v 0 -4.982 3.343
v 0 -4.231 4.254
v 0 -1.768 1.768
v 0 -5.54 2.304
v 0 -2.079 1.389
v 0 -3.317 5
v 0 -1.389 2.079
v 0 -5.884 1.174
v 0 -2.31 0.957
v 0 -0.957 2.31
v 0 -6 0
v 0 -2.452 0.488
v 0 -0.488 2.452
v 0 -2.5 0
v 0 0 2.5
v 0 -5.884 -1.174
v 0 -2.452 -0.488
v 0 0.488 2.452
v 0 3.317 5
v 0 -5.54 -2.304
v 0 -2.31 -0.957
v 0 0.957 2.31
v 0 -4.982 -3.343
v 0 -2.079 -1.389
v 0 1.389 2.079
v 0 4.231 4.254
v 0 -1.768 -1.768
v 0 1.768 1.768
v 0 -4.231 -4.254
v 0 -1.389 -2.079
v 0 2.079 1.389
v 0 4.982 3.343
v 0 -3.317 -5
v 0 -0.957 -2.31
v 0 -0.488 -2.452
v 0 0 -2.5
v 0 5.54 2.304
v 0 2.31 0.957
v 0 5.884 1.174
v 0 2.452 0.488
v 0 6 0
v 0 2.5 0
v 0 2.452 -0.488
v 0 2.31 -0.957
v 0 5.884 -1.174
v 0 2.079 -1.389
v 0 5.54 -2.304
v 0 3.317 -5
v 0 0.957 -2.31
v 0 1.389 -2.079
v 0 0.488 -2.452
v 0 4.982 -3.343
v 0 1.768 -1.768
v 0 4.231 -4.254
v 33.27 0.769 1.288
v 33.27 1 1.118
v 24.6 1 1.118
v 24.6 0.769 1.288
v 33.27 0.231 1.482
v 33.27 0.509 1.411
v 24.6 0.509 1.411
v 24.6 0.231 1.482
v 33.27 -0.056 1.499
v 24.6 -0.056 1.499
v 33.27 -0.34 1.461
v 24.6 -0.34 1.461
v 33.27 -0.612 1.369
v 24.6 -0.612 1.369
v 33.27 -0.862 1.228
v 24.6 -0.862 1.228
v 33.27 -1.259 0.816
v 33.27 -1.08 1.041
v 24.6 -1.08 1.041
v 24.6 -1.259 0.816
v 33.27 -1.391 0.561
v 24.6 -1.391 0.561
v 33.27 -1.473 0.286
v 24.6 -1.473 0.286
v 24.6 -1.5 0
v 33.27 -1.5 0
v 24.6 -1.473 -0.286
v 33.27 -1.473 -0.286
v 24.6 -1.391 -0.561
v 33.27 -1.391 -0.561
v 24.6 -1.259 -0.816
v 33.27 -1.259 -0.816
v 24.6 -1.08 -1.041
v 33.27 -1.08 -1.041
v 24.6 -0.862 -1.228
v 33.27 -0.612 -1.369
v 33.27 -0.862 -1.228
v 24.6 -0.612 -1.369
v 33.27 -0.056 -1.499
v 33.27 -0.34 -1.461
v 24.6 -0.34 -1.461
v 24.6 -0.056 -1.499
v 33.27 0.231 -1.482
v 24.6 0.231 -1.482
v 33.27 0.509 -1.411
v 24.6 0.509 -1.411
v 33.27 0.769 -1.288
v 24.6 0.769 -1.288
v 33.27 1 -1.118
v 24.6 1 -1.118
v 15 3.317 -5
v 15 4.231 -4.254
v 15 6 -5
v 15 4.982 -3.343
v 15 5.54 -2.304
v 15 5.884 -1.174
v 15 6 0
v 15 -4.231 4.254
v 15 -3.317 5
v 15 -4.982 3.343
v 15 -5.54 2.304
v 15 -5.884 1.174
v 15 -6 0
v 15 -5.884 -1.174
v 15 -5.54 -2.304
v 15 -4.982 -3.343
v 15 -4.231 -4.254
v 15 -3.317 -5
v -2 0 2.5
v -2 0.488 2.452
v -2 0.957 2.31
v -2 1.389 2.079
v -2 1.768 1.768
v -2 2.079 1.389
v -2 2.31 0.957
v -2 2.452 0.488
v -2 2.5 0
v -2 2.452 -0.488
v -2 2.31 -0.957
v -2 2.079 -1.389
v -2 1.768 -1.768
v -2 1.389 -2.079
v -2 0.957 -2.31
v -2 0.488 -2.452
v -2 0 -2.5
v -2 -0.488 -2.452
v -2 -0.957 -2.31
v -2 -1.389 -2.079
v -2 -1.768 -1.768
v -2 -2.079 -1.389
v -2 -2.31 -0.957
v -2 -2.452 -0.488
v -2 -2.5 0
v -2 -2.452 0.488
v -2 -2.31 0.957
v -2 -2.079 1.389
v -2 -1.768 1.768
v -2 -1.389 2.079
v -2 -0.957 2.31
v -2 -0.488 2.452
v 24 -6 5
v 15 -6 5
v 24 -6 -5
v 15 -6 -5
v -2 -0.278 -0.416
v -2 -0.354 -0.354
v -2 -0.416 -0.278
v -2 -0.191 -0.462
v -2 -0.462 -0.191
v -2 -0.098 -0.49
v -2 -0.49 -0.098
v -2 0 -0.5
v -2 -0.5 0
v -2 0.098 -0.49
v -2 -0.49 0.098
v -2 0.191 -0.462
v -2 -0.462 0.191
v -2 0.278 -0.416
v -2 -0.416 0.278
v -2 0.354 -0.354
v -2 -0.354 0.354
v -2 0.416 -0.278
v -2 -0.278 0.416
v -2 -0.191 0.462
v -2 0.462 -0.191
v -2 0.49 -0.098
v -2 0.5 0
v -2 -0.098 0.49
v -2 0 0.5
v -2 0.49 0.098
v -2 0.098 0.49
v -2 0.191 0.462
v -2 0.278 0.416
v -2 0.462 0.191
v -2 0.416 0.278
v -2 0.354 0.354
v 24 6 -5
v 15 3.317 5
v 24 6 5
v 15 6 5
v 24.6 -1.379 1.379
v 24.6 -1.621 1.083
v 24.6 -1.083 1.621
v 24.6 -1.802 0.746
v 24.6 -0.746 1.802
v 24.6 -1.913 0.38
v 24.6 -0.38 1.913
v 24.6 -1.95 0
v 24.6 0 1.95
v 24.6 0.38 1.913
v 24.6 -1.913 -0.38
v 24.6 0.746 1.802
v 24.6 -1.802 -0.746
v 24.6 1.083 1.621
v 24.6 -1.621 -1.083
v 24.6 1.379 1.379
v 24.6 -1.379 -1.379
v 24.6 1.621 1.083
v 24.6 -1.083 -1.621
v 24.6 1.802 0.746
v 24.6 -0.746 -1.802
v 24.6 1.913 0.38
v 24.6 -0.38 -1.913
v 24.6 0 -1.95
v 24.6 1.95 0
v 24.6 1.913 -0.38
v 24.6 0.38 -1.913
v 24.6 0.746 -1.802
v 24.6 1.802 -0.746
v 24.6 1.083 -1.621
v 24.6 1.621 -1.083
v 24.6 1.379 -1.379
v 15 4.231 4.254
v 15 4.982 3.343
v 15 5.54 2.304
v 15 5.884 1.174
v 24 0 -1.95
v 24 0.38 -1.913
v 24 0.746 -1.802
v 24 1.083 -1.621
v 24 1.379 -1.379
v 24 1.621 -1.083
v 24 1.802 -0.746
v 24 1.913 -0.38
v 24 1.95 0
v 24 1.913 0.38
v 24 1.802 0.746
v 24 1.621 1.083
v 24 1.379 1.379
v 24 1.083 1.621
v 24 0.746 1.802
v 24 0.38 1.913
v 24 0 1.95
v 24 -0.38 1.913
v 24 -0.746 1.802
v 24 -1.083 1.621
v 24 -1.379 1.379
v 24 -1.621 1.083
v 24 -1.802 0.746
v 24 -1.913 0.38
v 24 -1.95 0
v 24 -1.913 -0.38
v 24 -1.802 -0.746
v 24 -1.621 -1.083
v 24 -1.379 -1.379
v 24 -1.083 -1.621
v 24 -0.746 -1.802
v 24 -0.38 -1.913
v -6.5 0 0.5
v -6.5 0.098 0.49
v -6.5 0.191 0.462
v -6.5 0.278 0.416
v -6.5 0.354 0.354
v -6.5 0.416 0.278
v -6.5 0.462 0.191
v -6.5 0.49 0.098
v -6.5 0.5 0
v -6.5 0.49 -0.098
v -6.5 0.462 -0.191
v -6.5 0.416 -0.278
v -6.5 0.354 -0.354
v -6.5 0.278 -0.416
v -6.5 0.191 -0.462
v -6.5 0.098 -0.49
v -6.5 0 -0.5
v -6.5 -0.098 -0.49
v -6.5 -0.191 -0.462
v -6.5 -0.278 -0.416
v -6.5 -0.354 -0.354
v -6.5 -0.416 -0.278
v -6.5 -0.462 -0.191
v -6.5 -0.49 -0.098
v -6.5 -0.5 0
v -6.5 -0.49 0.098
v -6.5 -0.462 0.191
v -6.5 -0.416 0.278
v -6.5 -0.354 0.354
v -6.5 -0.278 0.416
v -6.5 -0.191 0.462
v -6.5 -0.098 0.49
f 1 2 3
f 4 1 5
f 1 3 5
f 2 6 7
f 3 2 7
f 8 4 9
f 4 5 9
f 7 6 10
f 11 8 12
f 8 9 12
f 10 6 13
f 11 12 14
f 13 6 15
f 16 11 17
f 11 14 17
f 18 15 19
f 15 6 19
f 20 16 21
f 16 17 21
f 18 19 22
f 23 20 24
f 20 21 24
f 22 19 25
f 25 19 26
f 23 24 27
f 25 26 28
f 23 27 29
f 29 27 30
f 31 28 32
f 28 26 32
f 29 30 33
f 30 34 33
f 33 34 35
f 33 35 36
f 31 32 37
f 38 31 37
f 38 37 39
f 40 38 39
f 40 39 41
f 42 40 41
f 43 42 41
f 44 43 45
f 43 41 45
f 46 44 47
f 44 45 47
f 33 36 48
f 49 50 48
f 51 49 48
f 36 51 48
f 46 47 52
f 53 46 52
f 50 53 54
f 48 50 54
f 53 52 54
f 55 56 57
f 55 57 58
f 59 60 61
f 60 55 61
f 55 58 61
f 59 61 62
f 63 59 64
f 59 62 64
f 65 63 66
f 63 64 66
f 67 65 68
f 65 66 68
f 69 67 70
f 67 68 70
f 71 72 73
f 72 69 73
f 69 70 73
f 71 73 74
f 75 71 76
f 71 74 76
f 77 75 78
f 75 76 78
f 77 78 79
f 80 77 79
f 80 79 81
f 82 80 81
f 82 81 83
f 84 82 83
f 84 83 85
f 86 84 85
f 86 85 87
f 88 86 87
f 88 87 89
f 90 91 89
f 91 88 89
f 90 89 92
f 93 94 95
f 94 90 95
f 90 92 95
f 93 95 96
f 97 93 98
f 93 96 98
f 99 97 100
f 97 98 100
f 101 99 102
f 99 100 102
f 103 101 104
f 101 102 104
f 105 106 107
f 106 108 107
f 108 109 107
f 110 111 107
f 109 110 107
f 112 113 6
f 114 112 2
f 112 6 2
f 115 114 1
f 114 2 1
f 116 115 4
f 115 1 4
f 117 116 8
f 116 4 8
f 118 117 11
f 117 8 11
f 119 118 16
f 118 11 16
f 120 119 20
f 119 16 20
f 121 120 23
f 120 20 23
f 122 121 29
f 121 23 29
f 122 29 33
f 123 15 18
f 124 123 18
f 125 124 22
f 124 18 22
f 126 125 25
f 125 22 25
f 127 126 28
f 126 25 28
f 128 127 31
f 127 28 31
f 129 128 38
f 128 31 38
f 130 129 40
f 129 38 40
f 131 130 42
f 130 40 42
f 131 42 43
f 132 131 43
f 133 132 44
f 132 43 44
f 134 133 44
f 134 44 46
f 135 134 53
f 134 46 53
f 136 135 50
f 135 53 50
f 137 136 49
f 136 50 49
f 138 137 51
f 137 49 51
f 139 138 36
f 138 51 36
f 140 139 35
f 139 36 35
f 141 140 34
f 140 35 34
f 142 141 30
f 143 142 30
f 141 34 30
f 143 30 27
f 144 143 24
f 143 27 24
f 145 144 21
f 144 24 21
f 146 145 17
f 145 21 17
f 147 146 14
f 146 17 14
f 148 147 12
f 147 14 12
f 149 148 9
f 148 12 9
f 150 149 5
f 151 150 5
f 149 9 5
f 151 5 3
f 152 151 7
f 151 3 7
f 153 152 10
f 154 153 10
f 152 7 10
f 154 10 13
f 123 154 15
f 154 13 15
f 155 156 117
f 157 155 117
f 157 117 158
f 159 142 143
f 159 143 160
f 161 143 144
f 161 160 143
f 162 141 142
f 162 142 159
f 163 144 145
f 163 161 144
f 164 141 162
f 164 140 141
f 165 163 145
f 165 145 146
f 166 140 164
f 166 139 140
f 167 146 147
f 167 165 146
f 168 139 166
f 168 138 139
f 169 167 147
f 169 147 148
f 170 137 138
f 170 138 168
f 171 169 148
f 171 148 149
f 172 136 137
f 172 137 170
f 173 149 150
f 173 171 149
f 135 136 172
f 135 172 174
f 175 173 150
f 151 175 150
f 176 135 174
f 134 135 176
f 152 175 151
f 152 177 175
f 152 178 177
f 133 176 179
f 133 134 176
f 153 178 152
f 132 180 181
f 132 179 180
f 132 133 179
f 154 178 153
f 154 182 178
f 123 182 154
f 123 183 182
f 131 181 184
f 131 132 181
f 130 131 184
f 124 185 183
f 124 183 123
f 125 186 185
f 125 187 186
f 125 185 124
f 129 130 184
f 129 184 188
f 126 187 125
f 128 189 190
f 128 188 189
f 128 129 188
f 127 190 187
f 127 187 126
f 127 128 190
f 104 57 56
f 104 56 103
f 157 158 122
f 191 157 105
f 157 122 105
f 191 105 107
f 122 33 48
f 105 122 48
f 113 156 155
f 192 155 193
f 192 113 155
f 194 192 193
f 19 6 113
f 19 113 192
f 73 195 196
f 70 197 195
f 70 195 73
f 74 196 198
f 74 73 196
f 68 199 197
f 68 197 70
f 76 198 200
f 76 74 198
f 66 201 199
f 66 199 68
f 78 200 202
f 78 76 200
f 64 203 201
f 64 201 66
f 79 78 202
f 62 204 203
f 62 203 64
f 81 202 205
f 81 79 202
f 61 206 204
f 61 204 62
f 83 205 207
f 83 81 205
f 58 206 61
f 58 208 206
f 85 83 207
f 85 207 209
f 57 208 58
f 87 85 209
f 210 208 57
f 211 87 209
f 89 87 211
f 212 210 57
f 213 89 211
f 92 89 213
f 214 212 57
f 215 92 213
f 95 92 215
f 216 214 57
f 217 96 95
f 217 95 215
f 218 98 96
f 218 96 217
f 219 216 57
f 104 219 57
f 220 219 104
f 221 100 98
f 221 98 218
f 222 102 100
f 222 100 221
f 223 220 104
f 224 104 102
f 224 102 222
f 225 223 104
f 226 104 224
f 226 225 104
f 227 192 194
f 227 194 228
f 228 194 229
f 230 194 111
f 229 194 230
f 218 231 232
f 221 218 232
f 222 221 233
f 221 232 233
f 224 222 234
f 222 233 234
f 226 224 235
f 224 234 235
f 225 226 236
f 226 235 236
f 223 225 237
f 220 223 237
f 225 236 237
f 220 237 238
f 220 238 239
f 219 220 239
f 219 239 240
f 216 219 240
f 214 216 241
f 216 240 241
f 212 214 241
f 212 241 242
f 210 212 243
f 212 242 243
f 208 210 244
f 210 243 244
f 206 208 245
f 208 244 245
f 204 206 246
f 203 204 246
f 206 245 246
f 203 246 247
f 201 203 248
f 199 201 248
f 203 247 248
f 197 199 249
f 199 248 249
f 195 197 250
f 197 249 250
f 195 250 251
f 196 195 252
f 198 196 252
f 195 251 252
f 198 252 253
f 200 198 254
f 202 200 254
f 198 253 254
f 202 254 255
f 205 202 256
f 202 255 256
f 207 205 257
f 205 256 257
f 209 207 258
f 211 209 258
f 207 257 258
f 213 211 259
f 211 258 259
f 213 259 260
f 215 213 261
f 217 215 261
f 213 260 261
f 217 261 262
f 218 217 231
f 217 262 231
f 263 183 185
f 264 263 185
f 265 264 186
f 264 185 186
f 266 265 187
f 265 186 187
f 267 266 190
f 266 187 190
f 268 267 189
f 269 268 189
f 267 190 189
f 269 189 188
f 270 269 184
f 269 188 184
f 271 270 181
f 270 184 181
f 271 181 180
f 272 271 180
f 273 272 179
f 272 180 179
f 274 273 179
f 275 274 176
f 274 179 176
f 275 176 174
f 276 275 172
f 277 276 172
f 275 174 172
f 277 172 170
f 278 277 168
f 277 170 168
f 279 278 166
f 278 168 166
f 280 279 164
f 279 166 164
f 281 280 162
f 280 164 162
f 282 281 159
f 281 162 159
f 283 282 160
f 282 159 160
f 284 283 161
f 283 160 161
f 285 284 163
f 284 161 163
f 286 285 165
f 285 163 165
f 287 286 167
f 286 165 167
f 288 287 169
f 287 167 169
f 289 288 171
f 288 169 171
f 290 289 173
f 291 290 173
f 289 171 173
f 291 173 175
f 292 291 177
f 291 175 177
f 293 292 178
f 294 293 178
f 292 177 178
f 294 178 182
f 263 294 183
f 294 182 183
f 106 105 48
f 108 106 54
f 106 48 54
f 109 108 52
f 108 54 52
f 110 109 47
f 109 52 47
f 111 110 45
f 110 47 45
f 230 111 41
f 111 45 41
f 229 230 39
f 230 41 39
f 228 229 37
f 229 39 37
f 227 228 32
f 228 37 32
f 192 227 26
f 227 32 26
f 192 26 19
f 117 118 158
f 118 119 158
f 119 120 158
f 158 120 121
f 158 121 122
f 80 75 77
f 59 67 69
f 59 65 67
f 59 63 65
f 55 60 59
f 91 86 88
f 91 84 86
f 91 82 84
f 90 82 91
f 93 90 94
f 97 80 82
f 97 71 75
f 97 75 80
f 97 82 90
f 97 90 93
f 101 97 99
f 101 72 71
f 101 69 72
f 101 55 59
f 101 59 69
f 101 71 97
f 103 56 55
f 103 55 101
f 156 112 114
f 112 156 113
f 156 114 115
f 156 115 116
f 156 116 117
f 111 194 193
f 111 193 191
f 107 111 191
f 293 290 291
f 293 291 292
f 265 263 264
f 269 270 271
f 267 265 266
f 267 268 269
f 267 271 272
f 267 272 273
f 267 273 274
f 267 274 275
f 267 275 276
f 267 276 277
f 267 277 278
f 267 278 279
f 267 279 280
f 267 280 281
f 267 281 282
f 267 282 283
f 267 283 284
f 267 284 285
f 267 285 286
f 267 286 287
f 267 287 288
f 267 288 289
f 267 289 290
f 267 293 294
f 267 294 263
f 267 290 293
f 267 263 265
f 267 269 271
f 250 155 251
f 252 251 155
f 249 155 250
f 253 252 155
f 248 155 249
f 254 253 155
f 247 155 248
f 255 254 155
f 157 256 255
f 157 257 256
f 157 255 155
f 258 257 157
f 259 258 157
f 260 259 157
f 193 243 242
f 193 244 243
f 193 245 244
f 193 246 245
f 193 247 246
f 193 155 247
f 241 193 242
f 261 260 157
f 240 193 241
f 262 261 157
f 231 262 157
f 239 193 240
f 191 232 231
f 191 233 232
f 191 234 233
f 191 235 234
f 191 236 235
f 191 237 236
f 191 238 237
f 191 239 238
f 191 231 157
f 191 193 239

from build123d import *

# Parameters (mm, degrees)
BOSS_EXTRU_1_DEPTH      = 15
ESQUISSE2_R             = 2.5
BOSS_EXTRU_2_DEPTH      = 2
ESQUISSE3_W             = 10
ESQUISSE3_H             = 12
BOSS_EXTRU_3_DEPTH      = 9
ESQUISSE4_R             = 1.95
BOSS_EXTRU_4_DEPTH      = 0.6
ESQUISSE5_R             = 1.5
BOSS_EXTRU_5_DEPTH      = 8.67
ENL_V_START             = -8.67
ENL_V_MAT_EXTRU_1_DEPTH = 8.67
ESQUISSE7_R             = 0.5
BOSS_EXTRU_6_DEPTH      = 4.5


with BuildPart() as part:
    # Esquisse1 → Boss.-Extru.1 (new body)
    with BuildSketch(Plane(origin=(0, 0, 0), x_dir=(0, 0, -1), z_dir=(1, 0, 0))):
        with BuildLine():
            Line((-5, 3.31662479), (-5, -3.31662479))
            ThreePointArc((-5, -3.31662479), (0, -6), (5, -3.31662479))
            Line((5, -3.31662479), (5, 3.31662479))
            ThreePointArc((5, 3.31662479), (0, 6), (-5, 3.31662479))
        make_face()
    extrude(amount=BOSS_EXTRU_1_DEPTH)

    # Esquisse2 → Boss.-Extru.2 (add)
    with BuildSketch(Plane.ZY):
        Circle(ESQUISSE2_R)
    extrude(amount=BOSS_EXTRU_2_DEPTH)

    # Esquisse3 → Boss.-Extru.3 (add)
    with BuildSketch(Plane(origin=(15, 0, 0), x_dir=(0, 0, -1), z_dir=(1, 0, 0))):
        Rectangle(ESQUISSE3_W, ESQUISSE3_H)
    extrude(amount=BOSS_EXTRU_3_DEPTH)

    # Esquisse4 → Boss.-Extru.4 (add)
    with BuildSketch(Plane(origin=(24, 0, 0), x_dir=(0, 0, -1), z_dir=(1, 0, 0))):
        Circle(ESQUISSE4_R)
    extrude(amount=BOSS_EXTRU_4_DEPTH)

    # Esquisse5 → Boss.-Extru.5 (add)
    with BuildSketch(Plane(origin=(24.6, 0, 0), x_dir=(0, 0, -1), z_dir=(1, 0, 0))):
        Circle(ESQUISSE5_R)
    extrude(amount=BOSS_EXTRU_5_DEPTH)

    # Esquisse6 → Enlèv. mat.-Extru.1 (cut)
    with BuildSketch(Plane(origin=(33.27, 0, 0), x_dir=(0, 0, -1), z_dir=(1, 0, 0)).offset(ENL_V_START)):
        with BuildLine():
            Line((-1.118033989, 1), (1.118033989, 1))
            ThreePointArc((1.118033989, 1), (0, 1.5), (-1.118033989, 1))
        make_face()
    extrude(amount=ENL_V_MAT_EXTRU_1_DEPTH, mode=Mode.SUBTRACT)

    # Esquisse7 → Boss.-Extru.6 (add)
    with BuildSketch(Plane.ZY.offset(2)):
        Circle(ESQUISSE7_R)
    extrude(amount=BOSS_EXTRU_6_DEPTH)


solid = part.part
